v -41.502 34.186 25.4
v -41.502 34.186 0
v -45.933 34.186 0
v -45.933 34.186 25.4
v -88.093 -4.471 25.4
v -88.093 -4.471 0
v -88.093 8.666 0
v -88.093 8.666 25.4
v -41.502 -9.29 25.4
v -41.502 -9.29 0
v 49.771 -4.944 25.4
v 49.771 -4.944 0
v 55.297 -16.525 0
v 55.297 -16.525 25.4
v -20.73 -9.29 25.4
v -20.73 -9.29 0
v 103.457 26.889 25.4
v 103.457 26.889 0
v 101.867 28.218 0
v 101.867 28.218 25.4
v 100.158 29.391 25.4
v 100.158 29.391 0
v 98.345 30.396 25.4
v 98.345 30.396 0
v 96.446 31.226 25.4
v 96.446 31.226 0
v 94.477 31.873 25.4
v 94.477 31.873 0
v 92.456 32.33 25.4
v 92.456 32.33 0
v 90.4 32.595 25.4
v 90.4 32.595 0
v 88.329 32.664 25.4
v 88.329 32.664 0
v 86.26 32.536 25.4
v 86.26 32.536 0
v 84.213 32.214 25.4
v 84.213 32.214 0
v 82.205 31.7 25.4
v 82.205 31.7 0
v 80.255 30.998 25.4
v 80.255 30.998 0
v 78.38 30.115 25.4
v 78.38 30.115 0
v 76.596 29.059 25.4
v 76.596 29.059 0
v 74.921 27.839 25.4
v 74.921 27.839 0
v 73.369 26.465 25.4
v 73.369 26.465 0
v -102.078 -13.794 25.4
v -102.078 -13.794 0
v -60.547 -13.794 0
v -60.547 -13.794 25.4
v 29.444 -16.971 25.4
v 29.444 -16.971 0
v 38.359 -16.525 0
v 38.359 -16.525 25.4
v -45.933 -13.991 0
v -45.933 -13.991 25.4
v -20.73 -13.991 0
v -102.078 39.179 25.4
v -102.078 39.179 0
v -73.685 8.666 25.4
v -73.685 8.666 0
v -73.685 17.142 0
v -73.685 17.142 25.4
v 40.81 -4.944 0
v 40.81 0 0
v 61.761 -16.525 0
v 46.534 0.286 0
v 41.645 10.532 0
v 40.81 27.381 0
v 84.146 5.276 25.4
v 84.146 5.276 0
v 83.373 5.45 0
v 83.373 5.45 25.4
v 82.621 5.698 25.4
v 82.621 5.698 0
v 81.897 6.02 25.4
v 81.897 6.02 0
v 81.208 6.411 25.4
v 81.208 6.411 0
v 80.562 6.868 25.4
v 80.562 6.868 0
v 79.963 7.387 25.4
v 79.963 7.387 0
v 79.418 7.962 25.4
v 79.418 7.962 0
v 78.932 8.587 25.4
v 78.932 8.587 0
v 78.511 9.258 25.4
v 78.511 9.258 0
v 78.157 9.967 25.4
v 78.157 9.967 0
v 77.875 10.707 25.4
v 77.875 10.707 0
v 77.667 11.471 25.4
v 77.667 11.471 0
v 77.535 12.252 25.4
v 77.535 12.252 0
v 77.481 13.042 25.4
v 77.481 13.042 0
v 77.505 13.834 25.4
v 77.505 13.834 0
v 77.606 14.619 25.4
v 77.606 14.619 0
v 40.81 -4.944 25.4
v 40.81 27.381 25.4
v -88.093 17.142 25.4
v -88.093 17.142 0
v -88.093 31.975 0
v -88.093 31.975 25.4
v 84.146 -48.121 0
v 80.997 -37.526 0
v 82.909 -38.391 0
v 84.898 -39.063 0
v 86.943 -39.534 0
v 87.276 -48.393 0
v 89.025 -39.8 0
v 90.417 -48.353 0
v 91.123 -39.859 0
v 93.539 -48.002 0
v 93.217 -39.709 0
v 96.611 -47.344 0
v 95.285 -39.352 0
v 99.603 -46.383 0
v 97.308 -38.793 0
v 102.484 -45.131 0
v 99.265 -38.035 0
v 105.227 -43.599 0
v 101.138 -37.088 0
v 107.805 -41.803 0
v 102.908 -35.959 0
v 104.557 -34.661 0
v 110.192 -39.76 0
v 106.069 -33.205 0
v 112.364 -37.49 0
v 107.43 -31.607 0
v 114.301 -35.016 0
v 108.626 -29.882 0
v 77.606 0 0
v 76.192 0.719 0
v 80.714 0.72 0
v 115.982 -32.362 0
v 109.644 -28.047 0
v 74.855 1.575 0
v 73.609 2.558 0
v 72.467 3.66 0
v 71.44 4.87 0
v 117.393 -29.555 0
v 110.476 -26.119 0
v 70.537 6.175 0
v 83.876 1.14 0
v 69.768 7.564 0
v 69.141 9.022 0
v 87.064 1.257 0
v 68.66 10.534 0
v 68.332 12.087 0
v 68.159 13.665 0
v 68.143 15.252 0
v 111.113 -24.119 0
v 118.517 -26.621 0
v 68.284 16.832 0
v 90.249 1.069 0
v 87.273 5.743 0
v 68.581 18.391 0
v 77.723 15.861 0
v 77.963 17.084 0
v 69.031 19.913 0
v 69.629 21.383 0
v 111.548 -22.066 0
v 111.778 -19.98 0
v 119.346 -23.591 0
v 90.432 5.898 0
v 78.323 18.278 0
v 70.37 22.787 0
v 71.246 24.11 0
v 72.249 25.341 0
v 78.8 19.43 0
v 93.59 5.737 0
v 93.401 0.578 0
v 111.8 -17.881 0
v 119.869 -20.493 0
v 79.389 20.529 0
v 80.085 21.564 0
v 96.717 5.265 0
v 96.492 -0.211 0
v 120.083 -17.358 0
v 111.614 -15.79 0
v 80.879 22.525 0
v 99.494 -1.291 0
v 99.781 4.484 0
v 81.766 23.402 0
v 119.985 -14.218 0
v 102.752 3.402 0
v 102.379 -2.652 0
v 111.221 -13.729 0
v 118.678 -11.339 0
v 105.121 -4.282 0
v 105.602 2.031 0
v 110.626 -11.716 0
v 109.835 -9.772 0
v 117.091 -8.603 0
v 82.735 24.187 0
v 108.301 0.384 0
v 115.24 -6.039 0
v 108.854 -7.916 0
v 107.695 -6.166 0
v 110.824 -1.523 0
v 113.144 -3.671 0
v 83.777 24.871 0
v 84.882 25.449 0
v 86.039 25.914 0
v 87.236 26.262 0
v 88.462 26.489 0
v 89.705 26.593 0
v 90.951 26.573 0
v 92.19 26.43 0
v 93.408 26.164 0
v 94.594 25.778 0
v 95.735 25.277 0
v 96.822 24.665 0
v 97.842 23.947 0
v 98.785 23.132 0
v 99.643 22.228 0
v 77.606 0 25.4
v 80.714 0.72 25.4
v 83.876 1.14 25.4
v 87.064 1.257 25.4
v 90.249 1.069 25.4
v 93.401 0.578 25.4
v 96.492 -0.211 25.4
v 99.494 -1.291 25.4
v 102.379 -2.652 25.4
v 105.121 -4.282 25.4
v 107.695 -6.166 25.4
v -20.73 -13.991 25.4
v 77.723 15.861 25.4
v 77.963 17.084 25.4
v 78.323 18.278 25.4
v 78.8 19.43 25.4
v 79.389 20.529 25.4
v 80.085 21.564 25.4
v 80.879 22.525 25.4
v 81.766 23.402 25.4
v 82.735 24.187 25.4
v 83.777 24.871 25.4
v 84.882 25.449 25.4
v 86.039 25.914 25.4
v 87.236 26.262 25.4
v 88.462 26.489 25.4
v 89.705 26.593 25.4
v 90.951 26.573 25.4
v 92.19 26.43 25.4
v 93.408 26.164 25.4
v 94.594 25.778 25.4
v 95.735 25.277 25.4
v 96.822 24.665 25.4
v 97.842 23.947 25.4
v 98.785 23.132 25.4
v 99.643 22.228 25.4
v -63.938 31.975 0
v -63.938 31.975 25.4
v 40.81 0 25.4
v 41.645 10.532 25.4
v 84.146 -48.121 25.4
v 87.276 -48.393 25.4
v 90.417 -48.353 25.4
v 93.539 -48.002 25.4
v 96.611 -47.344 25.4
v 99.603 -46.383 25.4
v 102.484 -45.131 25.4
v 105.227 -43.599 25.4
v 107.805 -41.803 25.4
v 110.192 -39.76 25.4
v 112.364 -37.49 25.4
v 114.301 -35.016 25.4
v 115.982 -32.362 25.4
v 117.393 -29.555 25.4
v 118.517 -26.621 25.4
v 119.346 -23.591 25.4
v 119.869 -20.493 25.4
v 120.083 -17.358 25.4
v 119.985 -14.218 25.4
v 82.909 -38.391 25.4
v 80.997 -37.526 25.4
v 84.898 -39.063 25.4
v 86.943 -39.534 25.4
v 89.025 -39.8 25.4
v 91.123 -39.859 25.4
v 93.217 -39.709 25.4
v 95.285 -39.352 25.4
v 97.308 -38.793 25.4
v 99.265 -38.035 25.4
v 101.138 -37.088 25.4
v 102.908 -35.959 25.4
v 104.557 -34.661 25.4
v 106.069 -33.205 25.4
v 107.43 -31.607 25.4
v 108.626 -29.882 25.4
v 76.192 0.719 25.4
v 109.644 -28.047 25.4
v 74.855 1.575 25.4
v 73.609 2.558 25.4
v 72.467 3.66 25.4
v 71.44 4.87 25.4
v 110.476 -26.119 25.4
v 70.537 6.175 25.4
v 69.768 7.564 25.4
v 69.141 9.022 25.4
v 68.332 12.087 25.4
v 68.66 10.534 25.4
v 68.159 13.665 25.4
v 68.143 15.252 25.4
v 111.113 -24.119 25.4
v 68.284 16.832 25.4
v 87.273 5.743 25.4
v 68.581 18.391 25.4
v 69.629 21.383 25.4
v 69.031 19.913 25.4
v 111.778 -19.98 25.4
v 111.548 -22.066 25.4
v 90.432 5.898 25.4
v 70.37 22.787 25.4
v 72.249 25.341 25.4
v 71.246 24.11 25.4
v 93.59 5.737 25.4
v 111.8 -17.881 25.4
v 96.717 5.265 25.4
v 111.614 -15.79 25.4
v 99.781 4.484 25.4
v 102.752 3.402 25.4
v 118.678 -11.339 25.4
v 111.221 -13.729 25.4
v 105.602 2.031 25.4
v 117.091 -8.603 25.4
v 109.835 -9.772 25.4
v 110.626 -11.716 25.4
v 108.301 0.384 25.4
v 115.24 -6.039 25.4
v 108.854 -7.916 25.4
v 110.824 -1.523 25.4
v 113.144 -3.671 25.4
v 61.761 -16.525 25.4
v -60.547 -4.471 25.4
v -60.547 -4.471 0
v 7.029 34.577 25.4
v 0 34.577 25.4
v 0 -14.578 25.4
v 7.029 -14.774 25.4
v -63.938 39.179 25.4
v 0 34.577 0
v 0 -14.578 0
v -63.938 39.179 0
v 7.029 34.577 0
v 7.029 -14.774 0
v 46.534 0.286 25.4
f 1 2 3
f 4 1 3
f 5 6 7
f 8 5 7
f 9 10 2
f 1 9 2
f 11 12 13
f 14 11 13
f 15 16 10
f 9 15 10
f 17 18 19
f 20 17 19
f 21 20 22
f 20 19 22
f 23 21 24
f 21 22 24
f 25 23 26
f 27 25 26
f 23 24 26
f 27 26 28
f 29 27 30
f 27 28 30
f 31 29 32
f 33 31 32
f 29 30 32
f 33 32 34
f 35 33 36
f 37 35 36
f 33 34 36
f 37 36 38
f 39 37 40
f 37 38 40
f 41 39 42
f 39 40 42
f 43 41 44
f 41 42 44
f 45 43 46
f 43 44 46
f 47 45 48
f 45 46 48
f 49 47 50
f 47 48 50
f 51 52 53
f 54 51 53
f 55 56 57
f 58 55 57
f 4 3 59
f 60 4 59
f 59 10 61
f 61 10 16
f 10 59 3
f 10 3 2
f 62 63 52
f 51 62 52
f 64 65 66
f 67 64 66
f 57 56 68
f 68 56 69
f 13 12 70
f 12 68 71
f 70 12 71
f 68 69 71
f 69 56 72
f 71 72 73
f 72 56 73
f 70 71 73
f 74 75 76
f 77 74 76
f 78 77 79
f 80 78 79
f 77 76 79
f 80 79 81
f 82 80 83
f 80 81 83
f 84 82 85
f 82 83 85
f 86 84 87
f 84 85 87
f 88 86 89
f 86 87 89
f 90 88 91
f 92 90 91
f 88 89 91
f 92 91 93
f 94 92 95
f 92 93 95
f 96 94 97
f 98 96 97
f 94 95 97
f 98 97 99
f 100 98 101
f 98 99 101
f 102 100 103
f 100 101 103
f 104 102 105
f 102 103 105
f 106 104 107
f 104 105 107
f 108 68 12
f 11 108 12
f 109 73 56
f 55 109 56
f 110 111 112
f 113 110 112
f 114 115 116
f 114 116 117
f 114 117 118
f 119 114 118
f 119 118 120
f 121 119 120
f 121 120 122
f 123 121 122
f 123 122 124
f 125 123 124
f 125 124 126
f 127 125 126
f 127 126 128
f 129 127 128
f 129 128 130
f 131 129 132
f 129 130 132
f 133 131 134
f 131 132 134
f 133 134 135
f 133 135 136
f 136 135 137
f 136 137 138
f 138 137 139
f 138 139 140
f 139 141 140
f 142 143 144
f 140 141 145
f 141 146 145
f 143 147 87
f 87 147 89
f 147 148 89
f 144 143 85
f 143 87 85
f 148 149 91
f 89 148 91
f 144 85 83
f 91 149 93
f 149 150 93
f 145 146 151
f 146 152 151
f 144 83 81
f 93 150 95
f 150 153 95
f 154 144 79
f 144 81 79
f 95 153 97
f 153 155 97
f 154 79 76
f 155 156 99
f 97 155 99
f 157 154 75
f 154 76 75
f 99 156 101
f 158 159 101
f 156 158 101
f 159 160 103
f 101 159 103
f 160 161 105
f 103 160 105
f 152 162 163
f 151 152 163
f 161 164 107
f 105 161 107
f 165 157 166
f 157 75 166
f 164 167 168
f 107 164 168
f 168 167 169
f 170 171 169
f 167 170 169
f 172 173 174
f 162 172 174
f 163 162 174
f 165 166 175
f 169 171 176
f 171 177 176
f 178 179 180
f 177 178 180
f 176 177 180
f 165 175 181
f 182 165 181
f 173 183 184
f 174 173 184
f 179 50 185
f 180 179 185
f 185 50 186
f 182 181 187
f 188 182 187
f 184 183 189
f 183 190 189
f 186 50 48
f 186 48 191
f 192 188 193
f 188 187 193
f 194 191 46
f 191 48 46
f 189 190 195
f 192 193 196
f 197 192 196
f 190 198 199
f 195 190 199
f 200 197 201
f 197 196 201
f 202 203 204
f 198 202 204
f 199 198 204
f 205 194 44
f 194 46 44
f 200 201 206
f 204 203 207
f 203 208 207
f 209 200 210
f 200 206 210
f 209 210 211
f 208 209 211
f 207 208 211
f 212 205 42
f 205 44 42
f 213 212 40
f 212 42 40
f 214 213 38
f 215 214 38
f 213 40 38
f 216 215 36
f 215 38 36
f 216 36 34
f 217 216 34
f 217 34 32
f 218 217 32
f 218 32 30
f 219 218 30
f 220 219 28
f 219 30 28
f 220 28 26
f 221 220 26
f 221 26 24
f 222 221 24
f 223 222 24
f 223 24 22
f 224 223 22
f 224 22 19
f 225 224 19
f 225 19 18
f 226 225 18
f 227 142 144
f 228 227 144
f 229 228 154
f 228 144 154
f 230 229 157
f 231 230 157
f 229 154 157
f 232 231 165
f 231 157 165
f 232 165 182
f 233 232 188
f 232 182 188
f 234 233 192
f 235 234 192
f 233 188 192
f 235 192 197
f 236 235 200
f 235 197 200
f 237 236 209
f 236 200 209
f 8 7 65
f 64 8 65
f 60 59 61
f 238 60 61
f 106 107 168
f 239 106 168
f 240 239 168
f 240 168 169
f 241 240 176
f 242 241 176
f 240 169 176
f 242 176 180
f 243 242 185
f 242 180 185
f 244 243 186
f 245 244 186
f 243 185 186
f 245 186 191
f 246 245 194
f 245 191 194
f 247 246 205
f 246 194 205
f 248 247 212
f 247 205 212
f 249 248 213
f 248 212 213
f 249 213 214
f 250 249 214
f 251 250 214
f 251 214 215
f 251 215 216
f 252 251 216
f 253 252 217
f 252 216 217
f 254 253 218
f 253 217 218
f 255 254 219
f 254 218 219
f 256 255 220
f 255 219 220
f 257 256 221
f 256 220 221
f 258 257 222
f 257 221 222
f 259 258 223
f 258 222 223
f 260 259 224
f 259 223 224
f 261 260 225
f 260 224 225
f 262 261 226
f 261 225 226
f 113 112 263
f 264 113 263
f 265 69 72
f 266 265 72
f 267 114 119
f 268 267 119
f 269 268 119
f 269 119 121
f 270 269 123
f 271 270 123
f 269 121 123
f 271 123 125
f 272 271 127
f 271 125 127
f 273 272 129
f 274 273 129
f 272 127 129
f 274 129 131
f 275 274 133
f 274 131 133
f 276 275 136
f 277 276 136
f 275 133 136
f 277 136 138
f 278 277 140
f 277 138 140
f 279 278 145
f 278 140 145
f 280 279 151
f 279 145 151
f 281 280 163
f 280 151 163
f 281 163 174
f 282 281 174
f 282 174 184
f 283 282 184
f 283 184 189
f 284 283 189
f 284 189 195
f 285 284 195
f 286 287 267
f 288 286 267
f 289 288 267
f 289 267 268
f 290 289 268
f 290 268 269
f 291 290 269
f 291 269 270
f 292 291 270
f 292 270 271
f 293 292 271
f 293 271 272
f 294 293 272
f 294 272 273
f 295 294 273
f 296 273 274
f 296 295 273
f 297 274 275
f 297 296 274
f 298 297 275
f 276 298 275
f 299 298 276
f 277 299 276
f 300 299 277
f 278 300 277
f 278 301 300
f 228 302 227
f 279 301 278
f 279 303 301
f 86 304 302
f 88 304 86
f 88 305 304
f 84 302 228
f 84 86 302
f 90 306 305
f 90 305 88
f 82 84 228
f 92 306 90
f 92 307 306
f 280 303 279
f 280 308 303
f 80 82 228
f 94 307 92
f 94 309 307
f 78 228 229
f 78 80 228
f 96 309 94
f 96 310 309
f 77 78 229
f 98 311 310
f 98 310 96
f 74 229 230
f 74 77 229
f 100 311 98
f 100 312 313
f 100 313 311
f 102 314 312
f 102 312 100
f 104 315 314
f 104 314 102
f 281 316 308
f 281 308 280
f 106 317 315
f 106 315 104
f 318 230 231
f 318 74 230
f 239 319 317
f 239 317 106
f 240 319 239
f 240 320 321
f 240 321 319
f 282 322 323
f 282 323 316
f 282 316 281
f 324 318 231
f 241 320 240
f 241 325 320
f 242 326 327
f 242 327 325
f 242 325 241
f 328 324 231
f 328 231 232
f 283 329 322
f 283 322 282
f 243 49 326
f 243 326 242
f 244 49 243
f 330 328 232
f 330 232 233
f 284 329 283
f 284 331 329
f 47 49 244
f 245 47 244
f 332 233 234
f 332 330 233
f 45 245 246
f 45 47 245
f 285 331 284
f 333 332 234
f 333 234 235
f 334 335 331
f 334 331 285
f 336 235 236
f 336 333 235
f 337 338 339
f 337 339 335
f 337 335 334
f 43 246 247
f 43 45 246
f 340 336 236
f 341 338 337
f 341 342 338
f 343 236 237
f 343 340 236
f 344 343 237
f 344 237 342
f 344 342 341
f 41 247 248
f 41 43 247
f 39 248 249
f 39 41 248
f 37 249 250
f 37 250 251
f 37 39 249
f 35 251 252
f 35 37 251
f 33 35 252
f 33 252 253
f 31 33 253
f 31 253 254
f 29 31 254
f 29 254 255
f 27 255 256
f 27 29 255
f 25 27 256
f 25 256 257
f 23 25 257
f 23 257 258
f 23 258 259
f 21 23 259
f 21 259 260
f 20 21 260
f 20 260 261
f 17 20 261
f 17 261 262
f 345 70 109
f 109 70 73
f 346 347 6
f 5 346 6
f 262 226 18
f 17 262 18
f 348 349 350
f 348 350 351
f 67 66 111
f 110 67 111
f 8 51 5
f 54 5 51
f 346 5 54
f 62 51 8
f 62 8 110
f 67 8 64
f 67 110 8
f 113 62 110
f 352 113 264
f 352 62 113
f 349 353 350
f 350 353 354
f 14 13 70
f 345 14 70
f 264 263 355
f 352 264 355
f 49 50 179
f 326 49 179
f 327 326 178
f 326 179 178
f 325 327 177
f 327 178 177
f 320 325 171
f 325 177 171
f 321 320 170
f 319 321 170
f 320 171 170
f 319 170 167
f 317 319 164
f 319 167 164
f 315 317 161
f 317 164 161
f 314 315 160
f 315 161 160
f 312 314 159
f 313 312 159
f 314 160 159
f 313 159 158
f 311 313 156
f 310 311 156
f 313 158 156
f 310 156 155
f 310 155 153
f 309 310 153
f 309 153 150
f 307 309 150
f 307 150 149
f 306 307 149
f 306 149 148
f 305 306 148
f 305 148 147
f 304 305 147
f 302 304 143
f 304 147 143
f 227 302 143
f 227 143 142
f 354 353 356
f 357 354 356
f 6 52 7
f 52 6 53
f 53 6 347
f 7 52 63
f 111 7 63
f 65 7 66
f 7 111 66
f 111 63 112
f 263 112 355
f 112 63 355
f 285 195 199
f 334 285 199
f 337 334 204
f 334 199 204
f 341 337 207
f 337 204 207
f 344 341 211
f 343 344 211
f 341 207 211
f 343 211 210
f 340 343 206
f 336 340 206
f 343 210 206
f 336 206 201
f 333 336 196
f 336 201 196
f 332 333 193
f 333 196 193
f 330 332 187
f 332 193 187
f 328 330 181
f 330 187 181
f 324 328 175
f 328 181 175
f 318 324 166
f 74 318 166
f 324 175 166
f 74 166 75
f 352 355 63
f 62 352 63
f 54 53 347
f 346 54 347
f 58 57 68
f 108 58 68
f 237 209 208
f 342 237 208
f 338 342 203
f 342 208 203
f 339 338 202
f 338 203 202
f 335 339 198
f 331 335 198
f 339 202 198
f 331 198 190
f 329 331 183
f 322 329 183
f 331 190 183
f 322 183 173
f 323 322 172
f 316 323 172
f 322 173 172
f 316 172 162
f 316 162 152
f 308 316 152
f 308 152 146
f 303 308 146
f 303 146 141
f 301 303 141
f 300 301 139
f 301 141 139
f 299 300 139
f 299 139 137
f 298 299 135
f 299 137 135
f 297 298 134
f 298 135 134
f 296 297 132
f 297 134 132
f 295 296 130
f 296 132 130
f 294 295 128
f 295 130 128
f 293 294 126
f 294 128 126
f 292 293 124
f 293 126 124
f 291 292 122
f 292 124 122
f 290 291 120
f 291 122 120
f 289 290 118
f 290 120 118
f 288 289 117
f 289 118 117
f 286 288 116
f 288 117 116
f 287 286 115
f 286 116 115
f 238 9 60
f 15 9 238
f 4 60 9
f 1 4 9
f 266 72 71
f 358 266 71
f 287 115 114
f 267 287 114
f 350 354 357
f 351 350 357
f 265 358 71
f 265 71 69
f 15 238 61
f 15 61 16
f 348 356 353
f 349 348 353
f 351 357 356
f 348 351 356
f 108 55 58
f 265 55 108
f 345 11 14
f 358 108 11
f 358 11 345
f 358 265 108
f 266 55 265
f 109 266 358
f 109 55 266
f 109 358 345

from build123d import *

# Parameters (mm, degrees)
F3_DEPTH = 25.4
F4_DEPTH = 25.4
F5_DEPTH = 25.4
F7_DEPTH = 25.4
F8_DEPTH = 25.4


with BuildPart() as f3:
    # F2 (on Top) → F3 (new body)
    with BuildSketch(Plane.XY):
        Polygon((40.810443, 27.381433), (29.443722, -16.971085), (38.3588, -16.525332), (40.810443, -4.944342), (49.771493, -4.944342), (55.297449, -16.525332), (61.760884, -16.525332), align=None)
        Polygon((46.533596, 0.286157), (40.810443, 0), (41.644715, 10.532001), align=None, mode=Mode.SUBTRACT)
    extrude(amount=F3_DEPTH)


with BuildPart() as f4:
    # F1 (on Top) → F4 (new body)
    with BuildSketch(Plane.XY):
        Polygon((0, 34.577396), (0, -14.578045), (7.029417, -14.773884), (7.029417, 34.577396), align=None)
    extrude(amount=F4_DEPTH)


with BuildPart() as f5:
    # F0 (on Top) → F5 (new body)
    with BuildSketch(Plane.XY):
        Polygon((-41.501839, 34.185719), (-45.933153, 34.185719), (-45.933153, -13.990531), (-20.730037, -13.990531), (-20.730037, -9.290408), (-41.501839, -9.290408), align=None)
    extrude(amount=F5_DEPTH)


with BuildPart() as f7:
    # F6 (on Top) → F7 (new body)
    with BuildSketch(Plane.XY):
        Polygon((-102.078229, -13.794109), (-60.547348, -13.794109), (-60.547348, -4.47085), (-88.09334, -4.47085), (-88.09334, 8.666473), (-73.68467, 8.666473), (-73.68467, 17.14216), (-88.09334, 17.14216), (-88.09334, 31.974625), (-63.937619, 31.974625), (-63.937619, 39.178964), (-102.078229, 39.178964), align=None)
    extrude(amount=F7_DEPTH)


with BuildPart() as f8:
    # F6 (on Top) → F8 (new body)
    with BuildSketch(Plane.XY):
        with BuildLine():
            Line((99.643208, 22.227582), (103.457272, 26.889214))
            ThreePointArc((103.457272, 26.889214), (88.328602, 32.663695), (73.368564, 26.465423))
            ThreePointArc((73.368564, 26.465423), (68.332102, 12.086937), (77.60641, 0))
            ThreePointArc((77.60641, 0), (93.401046, 0.578223), (107.695118, -6.165987))
            ThreePointArc((107.695118, -6.165987), (106.769493, -32.422847), (80.9967, -37.526041))
            Line((80.9967, -37.526041), (84.145661, -48.120655))
            ThreePointArc((84.145661, -48.120655), (110.191783, -39.759961), (119.984865, -14.217894))
            ThreePointArc((119.984865, -14.217894), (105.601958, 2.031243), (84.145661, 5.276199))
            ThreePointArc((84.145661, 5.276199), (78.932468, 8.58733), (77.60641, 14.619125))
            ThreePointArc((77.60641, 14.619125), (86.038582, 25.913986), (99.643208, 22.227582))
        make_face()
    extrude(amount=F8_DEPTH)


solid = Compound([f3.part, f4.part, f5.part, f7.part, f8.part])
